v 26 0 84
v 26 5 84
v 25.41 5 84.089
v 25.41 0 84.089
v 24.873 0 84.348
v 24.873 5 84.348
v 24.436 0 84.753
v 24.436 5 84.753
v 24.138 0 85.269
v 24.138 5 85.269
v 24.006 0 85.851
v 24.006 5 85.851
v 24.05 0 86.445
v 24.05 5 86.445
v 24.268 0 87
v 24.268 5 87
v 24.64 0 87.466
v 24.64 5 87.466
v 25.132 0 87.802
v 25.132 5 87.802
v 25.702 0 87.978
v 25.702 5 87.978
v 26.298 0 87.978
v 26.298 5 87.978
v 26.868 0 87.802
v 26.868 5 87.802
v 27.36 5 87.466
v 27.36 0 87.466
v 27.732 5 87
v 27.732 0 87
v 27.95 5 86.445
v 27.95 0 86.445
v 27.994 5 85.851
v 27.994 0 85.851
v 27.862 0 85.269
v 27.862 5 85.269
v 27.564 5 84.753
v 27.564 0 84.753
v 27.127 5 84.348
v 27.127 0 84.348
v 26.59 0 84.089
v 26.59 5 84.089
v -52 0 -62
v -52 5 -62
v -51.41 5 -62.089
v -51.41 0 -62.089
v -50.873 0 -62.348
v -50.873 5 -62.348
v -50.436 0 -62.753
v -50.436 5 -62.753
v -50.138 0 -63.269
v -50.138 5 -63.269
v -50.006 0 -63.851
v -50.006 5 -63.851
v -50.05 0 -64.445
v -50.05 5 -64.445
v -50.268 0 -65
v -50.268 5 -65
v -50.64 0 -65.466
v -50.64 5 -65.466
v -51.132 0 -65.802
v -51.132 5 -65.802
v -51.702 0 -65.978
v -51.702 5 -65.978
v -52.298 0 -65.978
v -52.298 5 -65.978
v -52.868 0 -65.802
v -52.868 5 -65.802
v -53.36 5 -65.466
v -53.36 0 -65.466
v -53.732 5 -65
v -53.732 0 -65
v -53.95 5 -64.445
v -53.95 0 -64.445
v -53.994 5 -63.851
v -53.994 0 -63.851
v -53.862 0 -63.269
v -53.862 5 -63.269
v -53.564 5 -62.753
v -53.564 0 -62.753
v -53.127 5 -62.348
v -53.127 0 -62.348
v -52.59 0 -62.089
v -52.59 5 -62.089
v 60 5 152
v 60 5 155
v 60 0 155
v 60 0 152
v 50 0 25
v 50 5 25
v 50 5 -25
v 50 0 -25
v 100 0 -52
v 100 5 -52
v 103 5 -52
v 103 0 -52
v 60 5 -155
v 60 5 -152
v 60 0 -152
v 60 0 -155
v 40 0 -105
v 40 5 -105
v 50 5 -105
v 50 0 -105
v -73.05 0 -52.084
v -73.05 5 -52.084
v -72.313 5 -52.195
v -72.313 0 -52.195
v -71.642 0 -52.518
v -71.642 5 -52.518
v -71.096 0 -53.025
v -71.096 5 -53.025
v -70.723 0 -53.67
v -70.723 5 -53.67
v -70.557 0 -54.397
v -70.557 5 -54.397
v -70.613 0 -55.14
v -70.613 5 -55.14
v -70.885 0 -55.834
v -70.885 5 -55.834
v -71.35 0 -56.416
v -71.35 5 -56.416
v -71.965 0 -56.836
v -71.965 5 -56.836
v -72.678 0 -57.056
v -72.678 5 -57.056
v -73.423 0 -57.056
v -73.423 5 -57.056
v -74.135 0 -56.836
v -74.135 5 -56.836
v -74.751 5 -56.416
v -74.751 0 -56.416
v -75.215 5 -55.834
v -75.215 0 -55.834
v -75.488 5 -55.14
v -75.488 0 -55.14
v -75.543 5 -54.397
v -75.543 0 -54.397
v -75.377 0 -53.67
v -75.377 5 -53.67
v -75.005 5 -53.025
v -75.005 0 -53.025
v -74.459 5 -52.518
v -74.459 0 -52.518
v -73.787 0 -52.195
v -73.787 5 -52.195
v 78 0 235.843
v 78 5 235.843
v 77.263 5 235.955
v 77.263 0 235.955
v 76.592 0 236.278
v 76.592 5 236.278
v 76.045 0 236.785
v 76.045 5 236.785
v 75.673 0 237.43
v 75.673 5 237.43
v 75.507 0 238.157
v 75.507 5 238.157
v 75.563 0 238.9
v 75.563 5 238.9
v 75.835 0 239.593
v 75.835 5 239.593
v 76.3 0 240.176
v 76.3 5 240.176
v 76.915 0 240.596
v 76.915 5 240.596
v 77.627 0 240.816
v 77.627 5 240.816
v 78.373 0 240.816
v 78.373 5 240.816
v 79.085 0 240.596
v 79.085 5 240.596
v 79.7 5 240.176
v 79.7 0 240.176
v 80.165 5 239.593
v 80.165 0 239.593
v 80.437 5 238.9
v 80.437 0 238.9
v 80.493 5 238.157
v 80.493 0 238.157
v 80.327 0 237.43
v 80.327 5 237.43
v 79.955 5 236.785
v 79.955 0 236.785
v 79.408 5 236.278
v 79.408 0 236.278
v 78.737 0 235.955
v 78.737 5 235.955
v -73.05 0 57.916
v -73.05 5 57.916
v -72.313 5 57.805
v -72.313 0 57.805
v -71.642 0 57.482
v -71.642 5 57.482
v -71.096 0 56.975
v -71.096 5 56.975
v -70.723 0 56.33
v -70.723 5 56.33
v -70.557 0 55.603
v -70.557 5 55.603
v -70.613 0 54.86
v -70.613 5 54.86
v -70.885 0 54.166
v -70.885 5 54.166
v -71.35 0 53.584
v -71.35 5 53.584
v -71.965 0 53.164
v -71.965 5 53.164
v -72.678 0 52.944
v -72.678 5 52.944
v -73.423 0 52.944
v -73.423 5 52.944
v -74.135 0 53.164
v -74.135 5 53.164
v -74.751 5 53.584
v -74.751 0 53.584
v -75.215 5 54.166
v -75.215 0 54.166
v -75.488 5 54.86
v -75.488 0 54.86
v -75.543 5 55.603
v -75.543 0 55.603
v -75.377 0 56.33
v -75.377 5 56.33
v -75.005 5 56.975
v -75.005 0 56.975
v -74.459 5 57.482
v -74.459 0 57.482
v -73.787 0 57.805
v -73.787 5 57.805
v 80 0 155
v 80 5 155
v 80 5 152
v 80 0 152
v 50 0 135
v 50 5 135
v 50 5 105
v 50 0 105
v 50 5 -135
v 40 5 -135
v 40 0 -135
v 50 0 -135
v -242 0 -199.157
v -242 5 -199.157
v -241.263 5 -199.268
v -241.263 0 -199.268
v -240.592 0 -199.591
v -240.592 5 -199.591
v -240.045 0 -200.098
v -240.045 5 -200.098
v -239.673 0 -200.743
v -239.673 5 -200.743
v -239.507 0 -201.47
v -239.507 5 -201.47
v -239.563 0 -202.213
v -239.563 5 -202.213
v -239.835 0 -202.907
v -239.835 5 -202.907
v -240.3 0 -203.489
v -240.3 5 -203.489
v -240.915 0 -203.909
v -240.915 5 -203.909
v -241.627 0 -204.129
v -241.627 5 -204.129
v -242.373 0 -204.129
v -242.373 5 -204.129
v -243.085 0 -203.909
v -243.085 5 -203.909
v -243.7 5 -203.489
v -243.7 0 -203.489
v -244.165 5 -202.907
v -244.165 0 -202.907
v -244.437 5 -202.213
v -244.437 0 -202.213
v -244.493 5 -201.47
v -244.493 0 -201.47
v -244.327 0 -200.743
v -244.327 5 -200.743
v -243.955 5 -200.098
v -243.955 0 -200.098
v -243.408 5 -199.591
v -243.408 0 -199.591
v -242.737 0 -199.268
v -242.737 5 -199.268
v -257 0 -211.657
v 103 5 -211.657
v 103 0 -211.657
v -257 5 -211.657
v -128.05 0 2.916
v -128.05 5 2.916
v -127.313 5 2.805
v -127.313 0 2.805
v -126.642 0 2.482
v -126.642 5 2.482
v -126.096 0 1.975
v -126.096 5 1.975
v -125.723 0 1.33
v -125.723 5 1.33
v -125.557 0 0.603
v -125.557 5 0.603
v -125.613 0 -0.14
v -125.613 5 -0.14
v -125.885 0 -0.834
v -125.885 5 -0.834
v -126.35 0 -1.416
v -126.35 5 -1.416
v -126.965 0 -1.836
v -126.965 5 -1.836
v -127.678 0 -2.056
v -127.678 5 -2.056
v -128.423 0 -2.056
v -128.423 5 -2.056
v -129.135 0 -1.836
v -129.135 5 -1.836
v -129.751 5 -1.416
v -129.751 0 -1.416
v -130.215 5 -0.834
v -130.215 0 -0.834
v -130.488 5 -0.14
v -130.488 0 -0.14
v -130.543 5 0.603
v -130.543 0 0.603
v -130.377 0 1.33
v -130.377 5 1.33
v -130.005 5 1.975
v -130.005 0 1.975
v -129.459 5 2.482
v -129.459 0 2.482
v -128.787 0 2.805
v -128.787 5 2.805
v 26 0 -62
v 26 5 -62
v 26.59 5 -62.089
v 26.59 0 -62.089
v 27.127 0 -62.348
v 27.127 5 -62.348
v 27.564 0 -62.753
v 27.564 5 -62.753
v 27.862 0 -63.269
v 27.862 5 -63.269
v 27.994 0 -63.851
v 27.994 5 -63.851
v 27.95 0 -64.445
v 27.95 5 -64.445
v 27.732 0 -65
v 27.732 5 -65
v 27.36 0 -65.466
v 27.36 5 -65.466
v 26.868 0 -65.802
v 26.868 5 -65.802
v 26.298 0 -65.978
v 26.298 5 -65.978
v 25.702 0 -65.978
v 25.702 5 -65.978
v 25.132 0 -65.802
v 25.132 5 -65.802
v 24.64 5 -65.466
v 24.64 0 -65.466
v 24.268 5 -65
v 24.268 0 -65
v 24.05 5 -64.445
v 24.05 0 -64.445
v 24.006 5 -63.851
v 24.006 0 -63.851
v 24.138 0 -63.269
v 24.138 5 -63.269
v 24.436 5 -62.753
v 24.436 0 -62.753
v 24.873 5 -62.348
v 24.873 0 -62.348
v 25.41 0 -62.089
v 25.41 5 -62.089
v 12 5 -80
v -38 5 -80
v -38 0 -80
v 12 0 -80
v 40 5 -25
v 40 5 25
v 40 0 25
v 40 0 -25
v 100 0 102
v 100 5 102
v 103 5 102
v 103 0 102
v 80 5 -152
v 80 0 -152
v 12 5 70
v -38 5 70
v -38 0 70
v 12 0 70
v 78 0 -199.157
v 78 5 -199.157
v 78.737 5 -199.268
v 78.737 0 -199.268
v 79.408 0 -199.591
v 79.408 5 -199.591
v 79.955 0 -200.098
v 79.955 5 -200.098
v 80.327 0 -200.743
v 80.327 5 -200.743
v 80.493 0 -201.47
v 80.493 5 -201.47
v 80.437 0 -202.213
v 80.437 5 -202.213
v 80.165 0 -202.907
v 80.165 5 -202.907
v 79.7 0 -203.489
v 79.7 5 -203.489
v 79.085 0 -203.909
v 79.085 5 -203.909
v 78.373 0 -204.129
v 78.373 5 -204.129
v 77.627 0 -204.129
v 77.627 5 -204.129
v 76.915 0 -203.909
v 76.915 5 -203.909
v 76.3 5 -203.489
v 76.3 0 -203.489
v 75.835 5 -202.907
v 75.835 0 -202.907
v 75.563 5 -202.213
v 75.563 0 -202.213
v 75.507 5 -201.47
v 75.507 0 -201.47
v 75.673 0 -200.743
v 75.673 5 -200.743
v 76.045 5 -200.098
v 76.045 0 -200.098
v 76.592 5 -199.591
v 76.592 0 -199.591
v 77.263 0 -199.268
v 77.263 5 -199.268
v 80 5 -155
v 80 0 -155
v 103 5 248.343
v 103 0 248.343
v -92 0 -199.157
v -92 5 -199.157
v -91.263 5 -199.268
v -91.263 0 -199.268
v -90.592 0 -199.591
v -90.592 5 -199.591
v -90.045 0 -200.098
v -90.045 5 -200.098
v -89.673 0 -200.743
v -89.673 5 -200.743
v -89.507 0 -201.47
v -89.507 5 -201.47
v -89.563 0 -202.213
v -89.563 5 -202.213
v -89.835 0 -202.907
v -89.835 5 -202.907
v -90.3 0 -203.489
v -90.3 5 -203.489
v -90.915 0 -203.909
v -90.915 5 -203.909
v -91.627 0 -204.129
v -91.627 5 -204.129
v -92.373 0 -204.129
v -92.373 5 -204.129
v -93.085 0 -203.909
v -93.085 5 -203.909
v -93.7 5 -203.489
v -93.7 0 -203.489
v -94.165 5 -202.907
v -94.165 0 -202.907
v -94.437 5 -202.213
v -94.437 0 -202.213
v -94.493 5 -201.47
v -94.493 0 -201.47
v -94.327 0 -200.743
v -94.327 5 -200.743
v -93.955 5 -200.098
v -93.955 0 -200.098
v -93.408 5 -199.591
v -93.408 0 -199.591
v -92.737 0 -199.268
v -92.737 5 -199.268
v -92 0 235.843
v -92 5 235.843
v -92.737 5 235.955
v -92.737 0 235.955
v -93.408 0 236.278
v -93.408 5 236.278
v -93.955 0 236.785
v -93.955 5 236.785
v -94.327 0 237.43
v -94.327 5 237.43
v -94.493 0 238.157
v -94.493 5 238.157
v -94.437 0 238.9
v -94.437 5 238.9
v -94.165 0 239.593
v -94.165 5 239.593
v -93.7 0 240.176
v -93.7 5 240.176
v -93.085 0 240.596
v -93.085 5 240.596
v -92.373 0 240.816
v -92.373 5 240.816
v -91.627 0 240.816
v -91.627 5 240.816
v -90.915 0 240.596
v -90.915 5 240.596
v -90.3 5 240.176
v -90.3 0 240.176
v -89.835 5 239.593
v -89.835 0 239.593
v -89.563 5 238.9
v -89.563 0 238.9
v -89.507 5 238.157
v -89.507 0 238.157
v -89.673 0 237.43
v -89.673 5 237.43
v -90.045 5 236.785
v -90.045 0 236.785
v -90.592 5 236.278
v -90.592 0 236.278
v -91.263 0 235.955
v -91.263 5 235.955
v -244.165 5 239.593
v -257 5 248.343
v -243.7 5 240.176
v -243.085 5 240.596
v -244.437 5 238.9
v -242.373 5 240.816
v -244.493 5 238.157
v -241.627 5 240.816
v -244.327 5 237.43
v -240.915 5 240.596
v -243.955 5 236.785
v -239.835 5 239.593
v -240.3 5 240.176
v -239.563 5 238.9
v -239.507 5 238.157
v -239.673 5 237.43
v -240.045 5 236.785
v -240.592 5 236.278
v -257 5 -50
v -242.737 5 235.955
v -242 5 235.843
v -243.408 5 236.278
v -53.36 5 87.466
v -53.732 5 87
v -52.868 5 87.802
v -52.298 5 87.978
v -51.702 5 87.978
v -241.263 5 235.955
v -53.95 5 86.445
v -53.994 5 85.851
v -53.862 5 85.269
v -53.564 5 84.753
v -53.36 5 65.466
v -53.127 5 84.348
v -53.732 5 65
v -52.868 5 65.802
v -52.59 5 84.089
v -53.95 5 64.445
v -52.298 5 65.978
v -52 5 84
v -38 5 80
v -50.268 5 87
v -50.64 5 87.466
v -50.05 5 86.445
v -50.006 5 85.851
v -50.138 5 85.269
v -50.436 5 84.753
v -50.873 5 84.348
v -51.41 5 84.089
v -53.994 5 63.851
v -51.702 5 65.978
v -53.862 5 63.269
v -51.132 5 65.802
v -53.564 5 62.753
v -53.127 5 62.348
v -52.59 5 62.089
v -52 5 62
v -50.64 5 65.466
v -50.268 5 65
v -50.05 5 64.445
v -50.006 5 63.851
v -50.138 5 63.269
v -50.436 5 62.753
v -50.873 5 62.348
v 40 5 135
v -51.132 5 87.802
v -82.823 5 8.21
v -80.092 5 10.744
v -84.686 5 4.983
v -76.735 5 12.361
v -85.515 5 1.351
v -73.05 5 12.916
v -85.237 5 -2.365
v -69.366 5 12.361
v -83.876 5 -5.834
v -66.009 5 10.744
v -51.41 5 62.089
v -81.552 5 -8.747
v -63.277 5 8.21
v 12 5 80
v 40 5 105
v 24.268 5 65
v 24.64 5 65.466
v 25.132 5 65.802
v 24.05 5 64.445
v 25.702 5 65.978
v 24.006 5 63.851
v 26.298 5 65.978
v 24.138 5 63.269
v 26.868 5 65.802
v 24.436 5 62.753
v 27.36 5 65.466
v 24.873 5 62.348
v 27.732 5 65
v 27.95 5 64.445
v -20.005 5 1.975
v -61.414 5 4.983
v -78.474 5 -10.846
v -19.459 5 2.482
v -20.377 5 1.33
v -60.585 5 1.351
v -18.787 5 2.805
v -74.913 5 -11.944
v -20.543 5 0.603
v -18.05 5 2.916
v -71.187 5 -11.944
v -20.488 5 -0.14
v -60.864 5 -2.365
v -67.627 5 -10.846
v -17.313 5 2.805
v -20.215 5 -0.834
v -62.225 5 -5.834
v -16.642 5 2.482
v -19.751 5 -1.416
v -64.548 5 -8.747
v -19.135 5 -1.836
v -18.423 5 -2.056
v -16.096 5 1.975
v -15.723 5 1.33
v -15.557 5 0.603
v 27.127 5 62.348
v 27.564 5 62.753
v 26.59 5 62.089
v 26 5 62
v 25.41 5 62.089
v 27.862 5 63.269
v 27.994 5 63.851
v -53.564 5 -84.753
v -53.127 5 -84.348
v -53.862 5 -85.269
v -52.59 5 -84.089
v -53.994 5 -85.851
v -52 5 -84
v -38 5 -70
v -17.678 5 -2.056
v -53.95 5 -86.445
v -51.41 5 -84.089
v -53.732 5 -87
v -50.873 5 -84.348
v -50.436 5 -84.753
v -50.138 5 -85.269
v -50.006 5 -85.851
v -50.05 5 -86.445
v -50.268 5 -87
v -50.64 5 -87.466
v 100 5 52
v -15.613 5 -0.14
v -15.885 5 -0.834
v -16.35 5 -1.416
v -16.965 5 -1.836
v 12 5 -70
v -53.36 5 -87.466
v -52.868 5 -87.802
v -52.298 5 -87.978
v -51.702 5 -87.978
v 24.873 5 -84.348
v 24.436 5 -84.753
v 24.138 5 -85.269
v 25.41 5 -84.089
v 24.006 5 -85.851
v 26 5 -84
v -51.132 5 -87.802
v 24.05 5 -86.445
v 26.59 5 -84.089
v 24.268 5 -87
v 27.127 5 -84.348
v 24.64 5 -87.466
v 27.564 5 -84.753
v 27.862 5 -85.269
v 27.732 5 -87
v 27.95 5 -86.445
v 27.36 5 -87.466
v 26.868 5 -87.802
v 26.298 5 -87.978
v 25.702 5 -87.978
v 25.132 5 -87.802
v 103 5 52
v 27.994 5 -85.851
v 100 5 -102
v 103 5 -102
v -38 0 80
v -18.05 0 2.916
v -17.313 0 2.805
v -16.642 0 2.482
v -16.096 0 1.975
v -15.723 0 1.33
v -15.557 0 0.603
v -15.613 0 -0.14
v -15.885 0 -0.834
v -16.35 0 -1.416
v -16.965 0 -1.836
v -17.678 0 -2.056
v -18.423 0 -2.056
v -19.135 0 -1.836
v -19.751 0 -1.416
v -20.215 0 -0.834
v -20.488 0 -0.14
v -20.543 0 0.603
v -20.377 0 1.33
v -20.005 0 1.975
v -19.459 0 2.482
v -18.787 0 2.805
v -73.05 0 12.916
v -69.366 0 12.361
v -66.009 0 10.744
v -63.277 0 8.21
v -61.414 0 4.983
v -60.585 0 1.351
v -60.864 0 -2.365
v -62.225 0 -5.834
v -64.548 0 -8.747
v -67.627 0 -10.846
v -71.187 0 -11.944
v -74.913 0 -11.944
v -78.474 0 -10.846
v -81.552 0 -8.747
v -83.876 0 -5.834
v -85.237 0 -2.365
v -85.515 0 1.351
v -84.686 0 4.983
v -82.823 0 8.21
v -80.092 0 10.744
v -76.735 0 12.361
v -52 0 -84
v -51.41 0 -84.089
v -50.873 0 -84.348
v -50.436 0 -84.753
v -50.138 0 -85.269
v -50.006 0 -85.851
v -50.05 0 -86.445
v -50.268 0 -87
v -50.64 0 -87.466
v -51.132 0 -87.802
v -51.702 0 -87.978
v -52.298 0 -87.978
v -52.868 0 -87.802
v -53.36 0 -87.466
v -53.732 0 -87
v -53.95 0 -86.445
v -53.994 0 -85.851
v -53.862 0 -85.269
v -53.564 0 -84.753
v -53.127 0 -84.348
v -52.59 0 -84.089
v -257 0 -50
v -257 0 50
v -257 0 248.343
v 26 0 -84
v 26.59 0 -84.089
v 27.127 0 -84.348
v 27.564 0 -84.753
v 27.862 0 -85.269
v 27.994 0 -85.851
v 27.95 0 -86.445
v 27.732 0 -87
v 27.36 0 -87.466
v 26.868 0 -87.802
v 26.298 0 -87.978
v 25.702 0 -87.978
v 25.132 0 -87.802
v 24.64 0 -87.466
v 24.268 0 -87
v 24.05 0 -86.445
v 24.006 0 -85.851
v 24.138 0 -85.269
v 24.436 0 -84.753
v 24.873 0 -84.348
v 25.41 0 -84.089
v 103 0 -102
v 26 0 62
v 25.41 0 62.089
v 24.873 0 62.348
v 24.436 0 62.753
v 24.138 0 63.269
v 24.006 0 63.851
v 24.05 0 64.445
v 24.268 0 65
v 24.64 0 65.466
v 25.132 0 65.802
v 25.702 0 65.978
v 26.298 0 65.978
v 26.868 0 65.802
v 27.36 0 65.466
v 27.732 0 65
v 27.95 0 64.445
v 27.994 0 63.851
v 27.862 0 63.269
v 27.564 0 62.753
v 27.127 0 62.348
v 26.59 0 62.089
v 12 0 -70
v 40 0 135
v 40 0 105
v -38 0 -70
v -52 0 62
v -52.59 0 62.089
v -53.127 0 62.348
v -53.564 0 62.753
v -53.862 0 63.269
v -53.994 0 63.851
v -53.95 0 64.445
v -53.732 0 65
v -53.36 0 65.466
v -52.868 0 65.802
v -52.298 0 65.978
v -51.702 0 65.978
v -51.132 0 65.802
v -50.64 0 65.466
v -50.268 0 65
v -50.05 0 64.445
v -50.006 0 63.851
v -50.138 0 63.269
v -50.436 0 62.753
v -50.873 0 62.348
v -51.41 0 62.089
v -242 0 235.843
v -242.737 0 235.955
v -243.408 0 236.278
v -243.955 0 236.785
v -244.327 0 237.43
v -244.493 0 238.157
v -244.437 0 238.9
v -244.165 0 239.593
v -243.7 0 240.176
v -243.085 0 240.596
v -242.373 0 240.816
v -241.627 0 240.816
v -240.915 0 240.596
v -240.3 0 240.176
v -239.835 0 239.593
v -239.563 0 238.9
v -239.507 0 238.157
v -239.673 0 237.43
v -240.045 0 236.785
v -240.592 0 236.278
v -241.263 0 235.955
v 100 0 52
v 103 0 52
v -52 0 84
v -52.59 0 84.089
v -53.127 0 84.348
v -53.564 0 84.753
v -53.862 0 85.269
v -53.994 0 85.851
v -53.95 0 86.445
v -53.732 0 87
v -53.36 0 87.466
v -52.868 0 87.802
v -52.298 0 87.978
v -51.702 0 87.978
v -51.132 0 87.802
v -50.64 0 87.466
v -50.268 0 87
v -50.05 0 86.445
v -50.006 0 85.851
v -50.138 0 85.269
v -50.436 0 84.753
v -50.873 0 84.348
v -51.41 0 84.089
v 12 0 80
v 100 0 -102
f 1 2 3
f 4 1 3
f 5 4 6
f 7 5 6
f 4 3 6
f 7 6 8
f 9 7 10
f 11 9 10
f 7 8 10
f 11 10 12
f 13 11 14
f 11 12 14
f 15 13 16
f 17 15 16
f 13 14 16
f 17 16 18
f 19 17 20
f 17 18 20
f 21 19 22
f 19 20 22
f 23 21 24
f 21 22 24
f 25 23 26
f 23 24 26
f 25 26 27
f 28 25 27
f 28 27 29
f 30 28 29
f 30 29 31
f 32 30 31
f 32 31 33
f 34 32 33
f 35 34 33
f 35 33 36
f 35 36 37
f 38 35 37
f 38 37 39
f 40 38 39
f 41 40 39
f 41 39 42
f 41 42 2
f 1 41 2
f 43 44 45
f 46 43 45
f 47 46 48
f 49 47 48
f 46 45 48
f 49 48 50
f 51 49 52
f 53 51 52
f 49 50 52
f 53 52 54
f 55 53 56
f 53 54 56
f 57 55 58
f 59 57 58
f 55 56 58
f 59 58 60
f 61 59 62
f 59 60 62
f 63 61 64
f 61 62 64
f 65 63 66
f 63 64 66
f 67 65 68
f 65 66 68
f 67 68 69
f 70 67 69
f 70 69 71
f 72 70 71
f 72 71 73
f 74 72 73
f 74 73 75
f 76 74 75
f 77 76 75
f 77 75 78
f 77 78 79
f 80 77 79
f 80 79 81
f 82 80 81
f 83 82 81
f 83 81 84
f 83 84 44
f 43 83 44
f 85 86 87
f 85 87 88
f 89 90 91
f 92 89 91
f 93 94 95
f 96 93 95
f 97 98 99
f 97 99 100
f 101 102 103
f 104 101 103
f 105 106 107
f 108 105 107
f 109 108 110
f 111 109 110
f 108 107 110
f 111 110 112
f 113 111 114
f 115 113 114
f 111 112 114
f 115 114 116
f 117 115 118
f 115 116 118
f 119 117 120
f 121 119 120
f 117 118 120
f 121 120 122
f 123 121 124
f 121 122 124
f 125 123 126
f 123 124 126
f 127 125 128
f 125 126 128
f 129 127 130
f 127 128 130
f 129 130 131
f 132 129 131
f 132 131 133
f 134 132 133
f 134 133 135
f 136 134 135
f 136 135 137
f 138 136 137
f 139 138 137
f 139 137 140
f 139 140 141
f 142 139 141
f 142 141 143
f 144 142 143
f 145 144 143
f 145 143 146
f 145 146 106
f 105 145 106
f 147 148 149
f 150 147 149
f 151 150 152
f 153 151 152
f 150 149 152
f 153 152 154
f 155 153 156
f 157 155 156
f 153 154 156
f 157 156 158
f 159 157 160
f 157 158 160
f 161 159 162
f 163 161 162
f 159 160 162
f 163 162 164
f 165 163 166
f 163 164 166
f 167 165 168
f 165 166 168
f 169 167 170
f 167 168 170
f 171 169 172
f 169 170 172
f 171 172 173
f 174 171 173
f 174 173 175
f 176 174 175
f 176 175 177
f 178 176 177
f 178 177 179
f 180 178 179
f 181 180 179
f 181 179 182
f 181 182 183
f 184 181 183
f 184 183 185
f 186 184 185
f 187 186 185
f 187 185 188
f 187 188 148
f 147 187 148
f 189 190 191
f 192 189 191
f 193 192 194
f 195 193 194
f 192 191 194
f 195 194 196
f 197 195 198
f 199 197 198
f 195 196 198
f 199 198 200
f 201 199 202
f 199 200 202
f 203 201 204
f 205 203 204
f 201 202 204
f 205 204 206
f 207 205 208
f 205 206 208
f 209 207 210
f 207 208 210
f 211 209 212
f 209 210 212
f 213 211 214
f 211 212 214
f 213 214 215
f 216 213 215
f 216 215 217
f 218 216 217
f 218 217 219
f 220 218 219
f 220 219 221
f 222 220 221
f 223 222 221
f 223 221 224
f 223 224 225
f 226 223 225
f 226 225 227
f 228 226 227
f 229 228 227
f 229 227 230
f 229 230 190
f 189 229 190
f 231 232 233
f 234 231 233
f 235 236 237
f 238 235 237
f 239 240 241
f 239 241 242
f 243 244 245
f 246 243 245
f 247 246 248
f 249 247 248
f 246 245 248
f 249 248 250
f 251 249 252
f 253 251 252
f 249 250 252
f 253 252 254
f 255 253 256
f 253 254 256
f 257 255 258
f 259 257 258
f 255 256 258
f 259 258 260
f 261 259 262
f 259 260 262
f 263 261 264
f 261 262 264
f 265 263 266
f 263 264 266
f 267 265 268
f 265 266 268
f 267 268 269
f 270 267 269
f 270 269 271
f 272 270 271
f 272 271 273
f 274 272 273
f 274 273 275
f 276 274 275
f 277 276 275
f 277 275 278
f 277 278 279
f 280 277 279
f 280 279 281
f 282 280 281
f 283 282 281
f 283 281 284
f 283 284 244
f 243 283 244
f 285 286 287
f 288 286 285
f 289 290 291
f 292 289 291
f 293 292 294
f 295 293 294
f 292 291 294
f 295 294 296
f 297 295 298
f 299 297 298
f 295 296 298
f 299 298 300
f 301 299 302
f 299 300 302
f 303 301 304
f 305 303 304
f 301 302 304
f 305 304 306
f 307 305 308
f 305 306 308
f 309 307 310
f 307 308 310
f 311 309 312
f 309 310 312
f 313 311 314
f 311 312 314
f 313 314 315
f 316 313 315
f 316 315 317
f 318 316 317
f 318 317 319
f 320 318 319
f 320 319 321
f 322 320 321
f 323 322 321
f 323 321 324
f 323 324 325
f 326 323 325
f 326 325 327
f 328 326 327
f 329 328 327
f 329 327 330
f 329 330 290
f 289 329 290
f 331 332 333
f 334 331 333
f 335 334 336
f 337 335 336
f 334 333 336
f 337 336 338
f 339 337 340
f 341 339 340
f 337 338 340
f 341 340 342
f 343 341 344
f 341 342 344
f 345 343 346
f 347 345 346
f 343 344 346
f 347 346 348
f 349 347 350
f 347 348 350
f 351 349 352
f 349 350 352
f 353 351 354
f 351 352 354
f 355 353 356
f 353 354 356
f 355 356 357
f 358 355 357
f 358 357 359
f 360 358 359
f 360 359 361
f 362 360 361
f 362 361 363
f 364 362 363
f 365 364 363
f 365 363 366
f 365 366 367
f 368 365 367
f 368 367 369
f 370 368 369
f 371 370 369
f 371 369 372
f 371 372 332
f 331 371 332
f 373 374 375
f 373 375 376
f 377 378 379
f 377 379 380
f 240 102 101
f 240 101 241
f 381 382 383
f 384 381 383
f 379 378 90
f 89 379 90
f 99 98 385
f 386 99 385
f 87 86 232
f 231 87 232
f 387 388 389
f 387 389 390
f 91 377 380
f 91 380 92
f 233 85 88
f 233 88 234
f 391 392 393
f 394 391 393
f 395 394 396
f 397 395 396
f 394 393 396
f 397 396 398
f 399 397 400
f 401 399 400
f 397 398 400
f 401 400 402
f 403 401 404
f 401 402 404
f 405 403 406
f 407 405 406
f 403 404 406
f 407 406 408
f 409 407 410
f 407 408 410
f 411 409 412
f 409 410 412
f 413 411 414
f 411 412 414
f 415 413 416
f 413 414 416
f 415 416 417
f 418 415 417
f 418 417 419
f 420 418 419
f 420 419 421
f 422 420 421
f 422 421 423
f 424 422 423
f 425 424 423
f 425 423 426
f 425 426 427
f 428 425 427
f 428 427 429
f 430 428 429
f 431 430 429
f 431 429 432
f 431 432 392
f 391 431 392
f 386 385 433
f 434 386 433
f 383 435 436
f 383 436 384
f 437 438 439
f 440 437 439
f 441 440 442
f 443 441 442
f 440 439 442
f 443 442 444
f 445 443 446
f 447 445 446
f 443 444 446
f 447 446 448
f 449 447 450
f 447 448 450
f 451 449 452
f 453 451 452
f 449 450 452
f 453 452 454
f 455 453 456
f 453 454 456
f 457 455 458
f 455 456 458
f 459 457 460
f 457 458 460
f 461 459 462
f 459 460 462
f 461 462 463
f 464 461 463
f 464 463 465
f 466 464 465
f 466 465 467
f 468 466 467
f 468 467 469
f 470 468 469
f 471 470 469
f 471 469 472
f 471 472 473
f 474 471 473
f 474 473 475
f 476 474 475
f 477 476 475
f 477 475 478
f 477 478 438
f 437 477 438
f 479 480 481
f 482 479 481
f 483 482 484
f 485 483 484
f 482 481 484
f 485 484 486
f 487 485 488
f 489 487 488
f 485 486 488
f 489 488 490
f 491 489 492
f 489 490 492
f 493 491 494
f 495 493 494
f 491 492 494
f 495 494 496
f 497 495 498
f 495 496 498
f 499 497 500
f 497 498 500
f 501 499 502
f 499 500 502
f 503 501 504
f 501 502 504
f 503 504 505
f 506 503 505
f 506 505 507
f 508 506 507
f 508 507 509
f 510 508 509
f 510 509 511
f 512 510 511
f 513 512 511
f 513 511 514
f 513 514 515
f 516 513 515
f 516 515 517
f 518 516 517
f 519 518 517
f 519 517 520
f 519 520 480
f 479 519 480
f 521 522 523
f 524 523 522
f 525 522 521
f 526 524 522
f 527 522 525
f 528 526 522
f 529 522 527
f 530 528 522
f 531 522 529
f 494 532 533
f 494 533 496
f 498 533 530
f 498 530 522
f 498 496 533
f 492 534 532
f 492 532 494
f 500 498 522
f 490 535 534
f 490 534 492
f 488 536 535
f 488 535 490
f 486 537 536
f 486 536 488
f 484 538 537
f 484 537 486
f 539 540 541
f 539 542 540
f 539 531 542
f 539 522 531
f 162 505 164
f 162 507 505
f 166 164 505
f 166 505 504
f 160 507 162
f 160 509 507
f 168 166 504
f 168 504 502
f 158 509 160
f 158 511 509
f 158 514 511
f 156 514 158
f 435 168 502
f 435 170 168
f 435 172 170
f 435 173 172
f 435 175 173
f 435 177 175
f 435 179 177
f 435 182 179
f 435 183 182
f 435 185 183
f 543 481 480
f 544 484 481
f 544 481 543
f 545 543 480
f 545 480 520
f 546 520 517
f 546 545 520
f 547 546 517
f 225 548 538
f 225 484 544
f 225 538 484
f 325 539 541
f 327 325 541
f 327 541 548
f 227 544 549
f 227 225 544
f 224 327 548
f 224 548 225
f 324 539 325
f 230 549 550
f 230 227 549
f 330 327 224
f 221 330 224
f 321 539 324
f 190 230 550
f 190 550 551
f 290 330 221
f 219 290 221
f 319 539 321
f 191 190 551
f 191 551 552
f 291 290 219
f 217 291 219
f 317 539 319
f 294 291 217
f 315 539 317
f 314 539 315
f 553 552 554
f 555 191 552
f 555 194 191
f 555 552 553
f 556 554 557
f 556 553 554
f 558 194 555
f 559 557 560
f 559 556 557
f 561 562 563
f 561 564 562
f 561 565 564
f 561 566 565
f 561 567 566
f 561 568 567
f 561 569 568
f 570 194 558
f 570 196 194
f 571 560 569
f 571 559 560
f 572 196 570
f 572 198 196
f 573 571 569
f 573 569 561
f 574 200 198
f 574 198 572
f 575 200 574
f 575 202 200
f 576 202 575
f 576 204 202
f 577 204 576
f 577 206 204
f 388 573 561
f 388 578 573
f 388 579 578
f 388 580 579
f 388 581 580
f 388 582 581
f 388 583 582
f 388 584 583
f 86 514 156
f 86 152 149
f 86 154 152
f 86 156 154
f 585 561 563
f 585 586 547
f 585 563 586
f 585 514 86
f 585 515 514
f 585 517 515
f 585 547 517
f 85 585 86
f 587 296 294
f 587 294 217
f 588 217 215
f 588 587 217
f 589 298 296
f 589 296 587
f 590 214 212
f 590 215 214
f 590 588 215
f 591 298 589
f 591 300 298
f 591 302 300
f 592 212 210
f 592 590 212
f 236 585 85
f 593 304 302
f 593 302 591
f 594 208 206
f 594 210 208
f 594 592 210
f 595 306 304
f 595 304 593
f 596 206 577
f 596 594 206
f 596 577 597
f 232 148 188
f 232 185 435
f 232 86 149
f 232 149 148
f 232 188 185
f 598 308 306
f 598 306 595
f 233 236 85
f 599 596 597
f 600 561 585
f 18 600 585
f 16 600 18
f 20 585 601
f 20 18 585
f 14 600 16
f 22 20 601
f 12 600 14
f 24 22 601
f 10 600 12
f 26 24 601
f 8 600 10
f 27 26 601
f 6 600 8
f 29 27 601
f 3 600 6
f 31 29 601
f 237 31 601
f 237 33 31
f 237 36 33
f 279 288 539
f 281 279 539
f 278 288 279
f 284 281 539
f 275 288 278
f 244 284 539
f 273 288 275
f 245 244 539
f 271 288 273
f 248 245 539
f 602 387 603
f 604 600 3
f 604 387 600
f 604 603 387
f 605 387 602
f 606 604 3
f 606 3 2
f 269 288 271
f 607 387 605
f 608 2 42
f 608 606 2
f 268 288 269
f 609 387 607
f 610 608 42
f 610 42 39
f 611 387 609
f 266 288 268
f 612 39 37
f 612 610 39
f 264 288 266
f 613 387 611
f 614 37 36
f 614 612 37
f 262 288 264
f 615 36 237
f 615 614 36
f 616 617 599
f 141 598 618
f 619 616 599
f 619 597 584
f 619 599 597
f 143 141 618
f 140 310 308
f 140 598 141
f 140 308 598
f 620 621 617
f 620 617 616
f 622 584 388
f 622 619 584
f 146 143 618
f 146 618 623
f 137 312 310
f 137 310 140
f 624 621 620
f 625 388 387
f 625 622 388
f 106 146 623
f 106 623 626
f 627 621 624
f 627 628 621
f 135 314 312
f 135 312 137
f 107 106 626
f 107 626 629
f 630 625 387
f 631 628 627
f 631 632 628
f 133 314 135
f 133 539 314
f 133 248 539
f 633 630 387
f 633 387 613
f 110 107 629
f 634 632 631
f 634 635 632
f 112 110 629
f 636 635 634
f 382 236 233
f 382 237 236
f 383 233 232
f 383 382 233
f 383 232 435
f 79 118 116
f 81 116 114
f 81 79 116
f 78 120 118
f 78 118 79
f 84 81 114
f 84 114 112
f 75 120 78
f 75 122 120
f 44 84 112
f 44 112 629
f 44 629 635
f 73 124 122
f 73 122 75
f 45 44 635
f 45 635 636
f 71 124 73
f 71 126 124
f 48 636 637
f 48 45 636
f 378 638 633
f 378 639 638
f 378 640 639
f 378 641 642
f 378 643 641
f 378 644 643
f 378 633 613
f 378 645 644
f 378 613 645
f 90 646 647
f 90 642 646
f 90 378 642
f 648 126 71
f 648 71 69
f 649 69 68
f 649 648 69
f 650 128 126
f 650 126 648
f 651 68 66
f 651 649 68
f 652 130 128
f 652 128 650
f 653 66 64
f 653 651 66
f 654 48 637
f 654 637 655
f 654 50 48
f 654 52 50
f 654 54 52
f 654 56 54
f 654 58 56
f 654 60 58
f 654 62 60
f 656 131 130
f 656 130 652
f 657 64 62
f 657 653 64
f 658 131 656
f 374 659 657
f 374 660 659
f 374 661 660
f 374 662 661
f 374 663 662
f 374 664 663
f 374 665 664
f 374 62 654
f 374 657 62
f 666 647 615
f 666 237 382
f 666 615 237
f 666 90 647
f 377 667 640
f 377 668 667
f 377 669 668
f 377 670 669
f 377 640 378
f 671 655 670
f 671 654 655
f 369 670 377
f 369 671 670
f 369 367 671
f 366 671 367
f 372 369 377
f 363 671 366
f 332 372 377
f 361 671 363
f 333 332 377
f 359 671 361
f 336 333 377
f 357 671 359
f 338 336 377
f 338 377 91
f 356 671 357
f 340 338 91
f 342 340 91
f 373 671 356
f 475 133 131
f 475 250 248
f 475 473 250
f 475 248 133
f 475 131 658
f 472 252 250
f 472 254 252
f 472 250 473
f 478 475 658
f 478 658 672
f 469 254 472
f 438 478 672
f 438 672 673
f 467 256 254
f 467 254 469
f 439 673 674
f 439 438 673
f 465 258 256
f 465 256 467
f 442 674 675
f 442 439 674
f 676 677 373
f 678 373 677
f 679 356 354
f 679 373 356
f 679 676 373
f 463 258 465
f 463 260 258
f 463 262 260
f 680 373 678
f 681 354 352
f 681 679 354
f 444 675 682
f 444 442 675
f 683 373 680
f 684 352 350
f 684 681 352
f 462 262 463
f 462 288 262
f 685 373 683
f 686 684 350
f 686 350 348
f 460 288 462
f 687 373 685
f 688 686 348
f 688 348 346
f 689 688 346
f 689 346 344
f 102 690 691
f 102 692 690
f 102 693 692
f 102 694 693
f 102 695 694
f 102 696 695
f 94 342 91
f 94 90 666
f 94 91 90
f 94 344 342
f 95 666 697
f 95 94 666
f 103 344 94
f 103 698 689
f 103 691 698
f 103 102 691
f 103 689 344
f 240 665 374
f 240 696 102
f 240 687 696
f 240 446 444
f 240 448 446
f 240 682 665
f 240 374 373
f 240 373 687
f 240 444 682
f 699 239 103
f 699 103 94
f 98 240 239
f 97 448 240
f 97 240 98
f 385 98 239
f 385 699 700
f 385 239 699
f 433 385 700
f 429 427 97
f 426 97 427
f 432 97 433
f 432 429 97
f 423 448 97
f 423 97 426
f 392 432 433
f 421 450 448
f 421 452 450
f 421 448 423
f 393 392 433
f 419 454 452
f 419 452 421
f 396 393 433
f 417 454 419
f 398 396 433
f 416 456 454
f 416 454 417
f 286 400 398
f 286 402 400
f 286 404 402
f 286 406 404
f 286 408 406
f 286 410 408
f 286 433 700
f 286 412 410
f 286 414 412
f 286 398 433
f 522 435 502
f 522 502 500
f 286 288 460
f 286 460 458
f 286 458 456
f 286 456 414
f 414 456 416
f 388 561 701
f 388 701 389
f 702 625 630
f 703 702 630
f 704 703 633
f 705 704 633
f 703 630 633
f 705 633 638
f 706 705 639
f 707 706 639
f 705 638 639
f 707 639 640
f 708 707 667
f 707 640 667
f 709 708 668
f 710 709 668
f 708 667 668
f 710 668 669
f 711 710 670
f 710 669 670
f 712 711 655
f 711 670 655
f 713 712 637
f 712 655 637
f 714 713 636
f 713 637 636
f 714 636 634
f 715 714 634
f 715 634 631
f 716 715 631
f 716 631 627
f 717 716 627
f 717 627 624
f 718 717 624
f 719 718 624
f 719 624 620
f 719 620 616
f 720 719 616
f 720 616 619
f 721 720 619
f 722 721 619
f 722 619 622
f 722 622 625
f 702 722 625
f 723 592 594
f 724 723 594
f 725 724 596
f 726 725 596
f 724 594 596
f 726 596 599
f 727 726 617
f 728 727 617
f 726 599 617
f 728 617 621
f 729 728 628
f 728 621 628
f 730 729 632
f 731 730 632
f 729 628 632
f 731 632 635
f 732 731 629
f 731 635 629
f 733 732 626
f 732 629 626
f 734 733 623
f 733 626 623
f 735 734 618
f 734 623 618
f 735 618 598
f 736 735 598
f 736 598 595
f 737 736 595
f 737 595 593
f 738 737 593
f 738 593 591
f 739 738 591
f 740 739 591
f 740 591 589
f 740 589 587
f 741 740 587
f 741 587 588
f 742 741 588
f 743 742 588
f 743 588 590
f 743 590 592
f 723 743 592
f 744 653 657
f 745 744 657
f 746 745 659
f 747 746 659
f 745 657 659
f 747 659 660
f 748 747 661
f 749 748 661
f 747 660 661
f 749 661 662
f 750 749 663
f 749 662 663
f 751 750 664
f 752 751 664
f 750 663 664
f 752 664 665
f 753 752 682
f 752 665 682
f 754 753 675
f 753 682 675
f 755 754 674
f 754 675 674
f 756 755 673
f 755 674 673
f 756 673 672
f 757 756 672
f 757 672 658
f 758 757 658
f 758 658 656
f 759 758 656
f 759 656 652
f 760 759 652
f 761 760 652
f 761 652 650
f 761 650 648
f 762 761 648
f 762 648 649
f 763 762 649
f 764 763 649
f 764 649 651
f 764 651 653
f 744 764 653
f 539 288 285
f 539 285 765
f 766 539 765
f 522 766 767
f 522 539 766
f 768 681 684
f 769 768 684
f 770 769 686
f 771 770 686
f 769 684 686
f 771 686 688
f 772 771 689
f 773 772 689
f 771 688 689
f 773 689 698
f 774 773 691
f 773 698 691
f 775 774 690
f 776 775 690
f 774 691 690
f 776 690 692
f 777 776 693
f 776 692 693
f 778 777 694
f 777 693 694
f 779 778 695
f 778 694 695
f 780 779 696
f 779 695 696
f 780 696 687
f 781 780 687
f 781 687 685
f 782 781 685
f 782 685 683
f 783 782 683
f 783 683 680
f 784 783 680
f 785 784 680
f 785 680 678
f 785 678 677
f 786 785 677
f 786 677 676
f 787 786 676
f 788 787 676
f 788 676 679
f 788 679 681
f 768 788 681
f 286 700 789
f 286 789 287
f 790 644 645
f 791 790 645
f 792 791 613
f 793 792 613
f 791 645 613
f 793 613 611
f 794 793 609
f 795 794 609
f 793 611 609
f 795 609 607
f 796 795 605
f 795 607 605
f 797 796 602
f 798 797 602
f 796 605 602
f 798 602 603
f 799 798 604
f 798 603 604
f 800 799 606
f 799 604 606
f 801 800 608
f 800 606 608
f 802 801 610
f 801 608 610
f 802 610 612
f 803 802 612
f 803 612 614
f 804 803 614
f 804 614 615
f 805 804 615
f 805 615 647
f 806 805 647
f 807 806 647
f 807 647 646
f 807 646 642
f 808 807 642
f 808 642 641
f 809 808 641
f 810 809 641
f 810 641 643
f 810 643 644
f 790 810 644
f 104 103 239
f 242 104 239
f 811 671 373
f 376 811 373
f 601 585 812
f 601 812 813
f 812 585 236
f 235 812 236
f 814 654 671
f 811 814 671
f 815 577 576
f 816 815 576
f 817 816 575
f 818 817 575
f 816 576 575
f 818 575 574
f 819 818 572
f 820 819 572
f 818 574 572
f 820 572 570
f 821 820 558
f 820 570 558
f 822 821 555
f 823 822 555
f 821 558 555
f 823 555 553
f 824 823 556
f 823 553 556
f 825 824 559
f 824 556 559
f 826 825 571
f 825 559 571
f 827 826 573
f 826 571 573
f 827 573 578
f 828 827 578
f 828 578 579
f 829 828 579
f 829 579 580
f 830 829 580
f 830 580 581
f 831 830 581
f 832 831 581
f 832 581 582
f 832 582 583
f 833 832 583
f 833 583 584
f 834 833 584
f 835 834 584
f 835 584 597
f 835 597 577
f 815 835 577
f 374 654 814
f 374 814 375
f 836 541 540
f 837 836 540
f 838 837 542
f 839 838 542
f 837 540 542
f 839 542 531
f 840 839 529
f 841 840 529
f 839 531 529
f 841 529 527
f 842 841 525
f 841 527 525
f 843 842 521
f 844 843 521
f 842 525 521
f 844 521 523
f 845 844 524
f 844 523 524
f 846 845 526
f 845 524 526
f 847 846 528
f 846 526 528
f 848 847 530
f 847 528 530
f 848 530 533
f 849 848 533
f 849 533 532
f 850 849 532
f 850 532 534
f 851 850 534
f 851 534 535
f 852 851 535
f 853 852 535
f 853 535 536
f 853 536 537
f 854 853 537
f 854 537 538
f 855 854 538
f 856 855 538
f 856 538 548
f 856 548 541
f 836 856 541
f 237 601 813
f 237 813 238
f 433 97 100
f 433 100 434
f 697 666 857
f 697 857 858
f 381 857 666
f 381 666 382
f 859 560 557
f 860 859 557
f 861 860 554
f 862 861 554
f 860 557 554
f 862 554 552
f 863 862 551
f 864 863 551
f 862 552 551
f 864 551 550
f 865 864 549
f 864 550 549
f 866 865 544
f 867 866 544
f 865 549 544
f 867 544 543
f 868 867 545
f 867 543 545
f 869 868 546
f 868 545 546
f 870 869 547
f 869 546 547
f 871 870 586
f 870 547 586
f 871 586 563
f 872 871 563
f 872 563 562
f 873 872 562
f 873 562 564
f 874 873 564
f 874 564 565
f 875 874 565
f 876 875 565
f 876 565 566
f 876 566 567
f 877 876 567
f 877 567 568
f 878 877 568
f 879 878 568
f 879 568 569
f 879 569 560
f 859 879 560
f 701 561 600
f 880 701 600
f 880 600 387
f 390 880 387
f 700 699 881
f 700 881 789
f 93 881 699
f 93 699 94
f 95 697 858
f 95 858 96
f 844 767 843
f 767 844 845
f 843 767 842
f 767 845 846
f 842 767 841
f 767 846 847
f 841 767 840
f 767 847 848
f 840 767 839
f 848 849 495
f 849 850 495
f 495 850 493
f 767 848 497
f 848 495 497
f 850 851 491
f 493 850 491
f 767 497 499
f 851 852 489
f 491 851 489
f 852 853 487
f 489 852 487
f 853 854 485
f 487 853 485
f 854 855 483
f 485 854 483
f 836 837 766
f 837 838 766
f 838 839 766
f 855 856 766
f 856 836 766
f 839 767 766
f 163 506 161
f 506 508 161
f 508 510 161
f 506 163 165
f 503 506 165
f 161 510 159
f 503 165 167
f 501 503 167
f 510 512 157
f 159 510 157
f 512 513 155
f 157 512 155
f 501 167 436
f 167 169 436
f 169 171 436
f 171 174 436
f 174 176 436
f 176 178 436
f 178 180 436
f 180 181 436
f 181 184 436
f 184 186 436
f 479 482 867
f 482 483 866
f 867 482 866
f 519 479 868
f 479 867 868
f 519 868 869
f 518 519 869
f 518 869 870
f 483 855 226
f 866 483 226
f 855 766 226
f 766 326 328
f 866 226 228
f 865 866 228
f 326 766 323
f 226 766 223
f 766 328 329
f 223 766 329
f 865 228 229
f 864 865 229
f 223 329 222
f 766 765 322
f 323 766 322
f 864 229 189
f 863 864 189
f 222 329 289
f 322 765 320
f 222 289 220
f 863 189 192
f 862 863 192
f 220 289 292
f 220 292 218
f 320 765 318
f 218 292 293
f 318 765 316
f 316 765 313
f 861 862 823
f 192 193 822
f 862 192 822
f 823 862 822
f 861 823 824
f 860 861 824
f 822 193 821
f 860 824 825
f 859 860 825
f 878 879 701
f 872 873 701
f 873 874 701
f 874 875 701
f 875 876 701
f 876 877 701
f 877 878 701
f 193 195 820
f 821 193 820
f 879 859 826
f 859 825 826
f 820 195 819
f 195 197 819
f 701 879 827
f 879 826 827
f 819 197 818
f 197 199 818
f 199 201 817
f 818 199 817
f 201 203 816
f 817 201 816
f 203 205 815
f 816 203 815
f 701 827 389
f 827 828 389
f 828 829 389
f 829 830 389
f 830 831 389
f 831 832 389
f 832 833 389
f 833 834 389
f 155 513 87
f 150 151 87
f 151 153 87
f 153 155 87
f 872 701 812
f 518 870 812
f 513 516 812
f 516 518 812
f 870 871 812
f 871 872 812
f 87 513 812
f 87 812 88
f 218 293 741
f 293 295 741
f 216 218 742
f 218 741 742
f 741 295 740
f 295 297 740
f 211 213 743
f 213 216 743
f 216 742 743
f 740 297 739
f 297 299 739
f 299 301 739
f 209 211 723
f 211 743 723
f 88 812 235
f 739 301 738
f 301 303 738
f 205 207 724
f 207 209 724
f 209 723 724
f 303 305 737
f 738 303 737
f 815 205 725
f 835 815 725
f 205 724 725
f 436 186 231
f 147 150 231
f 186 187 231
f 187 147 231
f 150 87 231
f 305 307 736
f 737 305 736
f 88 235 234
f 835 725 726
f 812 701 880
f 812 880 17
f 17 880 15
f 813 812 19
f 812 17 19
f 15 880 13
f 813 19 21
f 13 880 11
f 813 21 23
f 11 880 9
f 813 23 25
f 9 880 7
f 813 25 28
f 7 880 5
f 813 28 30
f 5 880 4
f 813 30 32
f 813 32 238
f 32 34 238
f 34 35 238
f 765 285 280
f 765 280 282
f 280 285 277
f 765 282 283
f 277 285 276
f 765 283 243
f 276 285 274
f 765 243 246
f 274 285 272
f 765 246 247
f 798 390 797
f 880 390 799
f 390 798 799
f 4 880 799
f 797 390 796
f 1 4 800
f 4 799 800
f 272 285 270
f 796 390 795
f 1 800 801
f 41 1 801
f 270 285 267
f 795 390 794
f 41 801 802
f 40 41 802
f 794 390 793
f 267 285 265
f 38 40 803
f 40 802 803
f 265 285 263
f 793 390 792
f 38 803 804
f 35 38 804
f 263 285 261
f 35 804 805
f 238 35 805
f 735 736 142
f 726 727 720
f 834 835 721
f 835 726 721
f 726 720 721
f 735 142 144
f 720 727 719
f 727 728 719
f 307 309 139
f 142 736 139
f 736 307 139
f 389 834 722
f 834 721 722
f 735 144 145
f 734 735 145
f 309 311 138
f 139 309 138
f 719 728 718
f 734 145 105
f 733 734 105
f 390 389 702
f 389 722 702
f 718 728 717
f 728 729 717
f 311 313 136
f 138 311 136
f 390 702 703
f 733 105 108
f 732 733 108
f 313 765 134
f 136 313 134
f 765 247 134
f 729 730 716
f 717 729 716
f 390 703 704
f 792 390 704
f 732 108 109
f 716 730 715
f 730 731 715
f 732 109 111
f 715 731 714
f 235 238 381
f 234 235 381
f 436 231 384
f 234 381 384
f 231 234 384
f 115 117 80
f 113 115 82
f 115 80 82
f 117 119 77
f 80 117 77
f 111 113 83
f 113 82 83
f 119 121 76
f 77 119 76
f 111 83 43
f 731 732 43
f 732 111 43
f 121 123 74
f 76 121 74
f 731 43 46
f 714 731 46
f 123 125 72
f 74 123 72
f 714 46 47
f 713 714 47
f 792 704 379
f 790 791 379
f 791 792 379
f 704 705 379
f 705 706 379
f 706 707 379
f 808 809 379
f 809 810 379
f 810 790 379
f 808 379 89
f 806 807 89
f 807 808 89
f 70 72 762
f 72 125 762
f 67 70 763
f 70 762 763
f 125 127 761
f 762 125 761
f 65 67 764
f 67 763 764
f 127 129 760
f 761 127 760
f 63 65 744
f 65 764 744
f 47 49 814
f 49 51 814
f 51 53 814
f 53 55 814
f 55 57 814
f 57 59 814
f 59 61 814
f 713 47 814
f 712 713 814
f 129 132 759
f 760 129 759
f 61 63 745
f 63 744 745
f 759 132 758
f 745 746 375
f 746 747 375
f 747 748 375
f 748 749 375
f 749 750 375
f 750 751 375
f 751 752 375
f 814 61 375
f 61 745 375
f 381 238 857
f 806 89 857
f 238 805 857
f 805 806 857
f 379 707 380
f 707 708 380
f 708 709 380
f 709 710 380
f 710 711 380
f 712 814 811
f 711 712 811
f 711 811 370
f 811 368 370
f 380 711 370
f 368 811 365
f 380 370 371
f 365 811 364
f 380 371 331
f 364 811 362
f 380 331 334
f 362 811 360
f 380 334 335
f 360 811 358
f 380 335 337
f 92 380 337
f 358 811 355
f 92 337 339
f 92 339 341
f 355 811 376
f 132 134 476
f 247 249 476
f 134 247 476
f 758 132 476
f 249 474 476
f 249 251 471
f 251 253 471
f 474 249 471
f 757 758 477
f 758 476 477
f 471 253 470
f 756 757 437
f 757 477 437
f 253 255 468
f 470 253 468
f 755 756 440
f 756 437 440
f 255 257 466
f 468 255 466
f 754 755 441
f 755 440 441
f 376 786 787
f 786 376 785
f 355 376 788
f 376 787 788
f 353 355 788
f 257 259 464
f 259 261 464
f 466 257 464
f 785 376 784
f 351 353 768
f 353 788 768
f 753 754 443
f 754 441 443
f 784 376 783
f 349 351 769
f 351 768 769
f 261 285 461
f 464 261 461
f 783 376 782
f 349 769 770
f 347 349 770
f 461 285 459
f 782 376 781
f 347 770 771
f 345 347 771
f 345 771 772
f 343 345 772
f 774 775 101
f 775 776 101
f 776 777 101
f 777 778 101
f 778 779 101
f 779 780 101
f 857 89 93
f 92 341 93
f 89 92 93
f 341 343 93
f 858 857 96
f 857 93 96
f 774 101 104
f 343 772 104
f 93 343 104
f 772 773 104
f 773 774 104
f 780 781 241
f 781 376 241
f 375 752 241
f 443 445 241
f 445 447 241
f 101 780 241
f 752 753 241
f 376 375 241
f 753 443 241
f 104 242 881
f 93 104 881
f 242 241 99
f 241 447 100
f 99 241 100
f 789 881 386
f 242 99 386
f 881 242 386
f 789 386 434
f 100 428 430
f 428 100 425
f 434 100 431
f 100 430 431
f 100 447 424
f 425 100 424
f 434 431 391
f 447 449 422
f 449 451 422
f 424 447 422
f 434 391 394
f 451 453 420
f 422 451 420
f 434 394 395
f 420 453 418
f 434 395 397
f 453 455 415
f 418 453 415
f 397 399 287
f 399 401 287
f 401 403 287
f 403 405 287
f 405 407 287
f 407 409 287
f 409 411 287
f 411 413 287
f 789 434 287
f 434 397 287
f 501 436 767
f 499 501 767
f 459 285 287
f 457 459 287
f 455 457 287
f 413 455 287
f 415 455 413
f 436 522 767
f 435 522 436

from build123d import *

# Parameters (mm, degrees)
EXTRUDE_1_DEPTH     = 5
SKETCH_2_W          = 20
SKETCH_2_H          = 3
SKETCH_2_W_2        = 10
SKETCH_2_H_2        = 30
SKETCH_2_H_3        = 50
CUT_EXTRUDE_1_DEPTH = 211.35683968
EXTRUDE_2_DEPTH     = 5
SKETCH_4_R          = 2
CUT_EXTRUDE_2_DEPTH = 620.212910153
SKETCH_6_W          = 3
SKETCH_6_H          = 50
SKETCH_6_H_2        = 104
EXTRUDE_3_DEPTH     = 5
EXTRUDE_4_DEPTH     = 5
SKETCH_8_R          = 2
SKETCH_8_W          = 50
SKETCH_8_H          = 10
CUT_EXTRUDE_3_DEPTH = 620.212910153
SKETCH_9_R          = 2
CUT_EXTRUDE_4_DEPTH = 620.212910153
SKETCH_10_R         = 7.5
CUT_EXTRUDE_5_DEPTH = 620.212910153
EXTRUDE_5_DEPTH     = 5
SKETCH_12_W         = 370.436309817
SKETCH_12_H         = 460
CUT_EXTRUDE_6_DEPTH = 641.99462376
SKETCH_15_R         = 2.5
SKETCH_15_R_2       = 12.5
CUT_EXTRUDE_7_DEPTH = 358.41919309
SKETCH_16_R         = 2
EXTRUDE_6_DEPTH     = 5


with BuildPart() as part:
    # 스케치1 → 보스-돌출1 (new body)
    with BuildSketch(Plane(origin=(0, 0, 0), x_dir=(1, 0, 0), z_dir=(0, 1, 0))):
        Polygon((-50, 175), (0, 175), (0, 185), (50, 185), (50, 175), (100, 175), (100, -175), (50, -175), (50, -185), (0, -185), (0, -175), (-50, -175), (-50, -185), (-100, -185), (-100, -175), (-100, 175), (-100, 185), (-50, 185), align=None)
    extrude(amount=EXTRUDE_1_DEPTH)

    # 스케치2 → 컷-돌출1 (cut, through all)
    with BuildSketch(Plane(origin=(0, 5, 0), x_dir=(1, 0, 0), z_dir=(0, 1, 0))):
        with Locations((70, 153.5)):
            Rectangle(SKETCH_2_W, SKETCH_2_H)
        with Locations((70, -153.5)):
            Rectangle(SKETCH_2_W, SKETCH_2_H)
        with Locations((45, 120)):
            Rectangle(SKETCH_2_W_2, SKETCH_2_H_2)
        with Locations((45, -120)):
            Rectangle(SKETCH_2_W_2, SKETCH_2_H_2)
        with Locations((45, 0)):
            Rectangle(SKETCH_2_W_2, SKETCH_2_H_3)
    extrude(amount=-CUT_EXTRUDE_1_DEPTH, mode=Mode.SUBTRACT)

    # 스케치3 → 보스-돌출2 (add)
    with BuildSketch(Plane(origin=(0, 5, 0), x_dir=(1, 0, 0), z_dir=(0, 1, 0))):
        Polygon((-540.91, 50), (-225, 50), (-100, 50), (-100, -50), (-225, -50), (-540.91, -50), (-540.91, -185), (-590.91, -185), (-590.91, 185), (-540.91, 185), align=None)
    extrude(amount=-EXTRUDE_2_DEPTH)

    # 스케치4 → 컷-돌출2 (cut, through all)
    with BuildSketch(Plane(origin=(0, 5, 0), x_dir=(1, 0, 0), z_dir=(0, 1, 0))):
        with Locations(Location((-578.91, 145, 0), (0, 0, 270))):
            Circle(SKETCH_4_R)
        with Locations(Location((-578.91, 95, 0), (0, 0, 270))):
            Circle(SKETCH_4_R)
        with Locations(Location((-566.91, 145, 0), (0, 0, 270))):
            Circle(SKETCH_4_R)
        with Locations(Location((-566.91, 95, 0), (0, 0, 270))):
            Circle(SKETCH_4_R)
        with Locations(Location((-578.91, -145, 0), (0, 0, 270))):
            Circle(SKETCH_4_R)
        with Locations(Location((-578.91, -95, 0), (0, 0, 270))):
            Circle(SKETCH_4_R)
        with Locations(Location((-566.91, -95, 0), (0, 0, 270))):
            Circle(SKETCH_4_R)
        with Locations(Location((-566.91, -145, 0), (0, 0, 270))):
            Circle(SKETCH_4_R)
    extrude(amount=-CUT_EXTRUDE_2_DEPTH, mode=Mode.SUBTRACT)

    # 스케치6 → 보스-돌출3 (add)
    with BuildSketch(Plane(origin=(0, 5, 0), x_dir=(1, 0, 0), z_dir=(0, 1, 0))):
        with Locations((101.5, -127)):
            Rectangle(SKETCH_6_W, SKETCH_6_H)
        with Locations((101.5, 127)):
            Rectangle(SKETCH_6_W, SKETCH_6_H)
        with Locations((101.5, 0)):
            Rectangle(SKETCH_6_W, SKETCH_6_H_2)
    extrude(amount=-EXTRUDE_3_DEPTH)

    # 스케치7 → 보스-돌출4 (add)
    with BuildSketch(Plane(origin=(0, 5, 0), x_dir=(1, 0, 0), z_dir=(0, 1, 0))):
        Polygon((-540.91, -185), (-537.91, -185), (-537.91, -92), (-495.91, -50), (-540.91, -50), align=None)
        Polygon((-537.91, 92), (-495.91, 50), (-540.91, 50), (-540.91, 185), (-537.91, 185), align=None)
        Polygon((-100, 95), (-145, 50), (-100, 50), align=None)
        Polygon((-100, -95), (-145, -50), (-100, -50), align=None)
    extrude(amount=-EXTRUDE_4_DEPTH)

    # 스케치8 → 컷-돌출3 (cut, through all)
    with BuildSketch(Plane(origin=(0, 5, 0), x_dir=(1, 0, 0), z_dir=(0, 1, 0))):
        with Locations(Location((-52, 86, 0), (0, 0, 270))):
            Circle(SKETCH_8_R)
        with Locations(Location((-52, 64, 0), (0, 0, 270))):
            Circle(SKETCH_8_R)
        with Locations(Location((26, 86, 0), (0, 0, 270))):
            Circle(SKETCH_8_R)
        with Locations(Location((26, 64, 0), (0, 0, 270))):
            Circle(SKETCH_8_R)
        with Locations(Location((-52, -86, 0), (0, 0, 90))):
            Circle(SKETCH_8_R)
        with Locations(Location((-52, -64, 0), (0, 0, 90))):
            Circle(SKETCH_8_R)
        with Locations(Location((26, -64, 0), (0, 0, 90))):
            Circle(SKETCH_8_R)
        with Locations(Location((26, -86, 0), (0, 0, 90))):
            Circle(SKETCH_8_R)
        with Locations((-13, 75)):
            Rectangle(SKETCH_8_W, SKETCH_8_H)
        with Locations((-13, -75)):
            Rectangle(SKETCH_8_W, SKETCH_8_H)
    extrude(amount=-CUT_EXTRUDE_3_DEPTH, mode=Mode.SUBTRACT)

    # 스케치9 → 컷-돌출4 (cut, through all)
    with BuildSketch(Plane(origin=(0, 5, 0), x_dir=(1, 0, 0), z_dir=(0, 1, 0))):
        with Locations(Location((-437.91, 30, 0), (0, 0, 270))):
            Circle(SKETCH_9_R)
        with Locations(Location((-235.58, 30, 0), (0, 0, 270))):
            Circle(SKETCH_9_R)
        with Locations(Location((-185.58, 30, 0), (0, 0, 270))):
            Circle(SKETCH_9_R)
        with Locations(Location((-185.58, -30, 0), (0, 0, 90))):
            Circle(SKETCH_9_R)
        with Locations(Location((-235.58, -30, 0), (0, 0, 90))):
            Circle(SKETCH_9_R)
        with Locations(Location((-437.91, -30, 0), (0, 0, 90))):
            Circle(SKETCH_9_R)
    extrude(amount=-CUT_EXTRUDE_4_DEPTH, mode=Mode.SUBTRACT)

    # 스케치10 → 컷-돌출5 (cut, through all)
    with BuildSketch(Plane(origin=(0, 5, 0), x_dir=(1, 0, 0), z_dir=(0, 1, 0))):
        with Locations(Location((-73, 0, 0), (0, 0, 270))):
            Circle(SKETCH_10_R)
    extrude(amount=-CUT_EXTRUDE_5_DEPTH, mode=Mode.SUBTRACT)

    # 스케치11 → 보스-돌출5 (add)
    with BuildSketch(Plane(origin=(0, 5, 0), x_dir=(1, 0, 0), z_dir=(0, 1, 0))):
        Polygon((-145, -50), (-257, -50), (-257, -248.343471002), (103, -248.343471002), (103, -152), (100, -152), (100, -175), (50, -175), (50, -185), (0, -185), (0, -175), (-50, -175), (-50, -185), (-100, -185), (-100, -95), align=None)
        Polygon((103, 152), (103, 211.656528998), (-257, 211.656528998), (-257, 50), (-145, 50), (-100, 95), (-100, 185), (-50, 185), (-50, 175), (0, 175), (0, 185), (50, 185), (50, 175), (100, 175), (100, 152), align=None)
    extrude(amount=-EXTRUDE_5_DEPTH)

    # 스케치12 → 컷-돌출6 (cut, through all)
    with BuildSketch(Plane(origin=(0, 5, 0), x_dir=(1, 0, 0), z_dir=(0, 1, 0))):
        with Locations((-442.218154909, -18.343471002)):
            Rectangle(SKETCH_12_W, SKETCH_12_H)
    extrude(amount=-CUT_EXTRUDE_6_DEPTH, mode=Mode.SUBTRACT)

    # 스케치15 → 컷-돌출7 (cut, through all)
    with BuildSketch(Plane(origin=(0, 5, 0), x_dir=(1, 0, 0), z_dir=(0, 1, 0))):
        with Locations(Location((-73.050208533, -55.416458765, 0), (0, 0, 270))):
            Circle(SKETCH_15_R)
        with Locations(Location((-128.050208533, -0.416458765, 0), (0, 0, 270))):
            Circle(SKETCH_15_R)
        with Locations(Location((-73.050208533, 54.583541235, 0), (0, 0, 270))):
            Circle(SKETCH_15_R)
        with Locations(Location((-18.050208533, -0.416458765, 0), (0, 0, 270))):
            Circle(SKETCH_15_R)
        with Locations(Location((-73.050208533, -0.416458765, 0), (0, 0, 270))):
            Circle(SKETCH_15_R_2)
        with Locations(Location((-242, 201.656528998, 0), (0, 0, 270))):
            Circle(SKETCH_15_R)
        with Locations(Location((-92, 201.656528998, 0), (0, 0, 270))):
            Circle(SKETCH_15_R)
        with Locations(Location((78, 201.656528998, 0), (0, 0, 270))):
            Circle(SKETCH_15_R)
        with Locations(Location((78, -238.343471002, 0), (0, 0, 90))):
            Circle(SKETCH_15_R)
        with Locations(Location((-92, -238.343471002, 0), (0, 0, 90))):
            Circle(SKETCH_15_R)
        with Locations(Location((-242, -238.343471002, 0), (0, 0, 90))):
            Circle(SKETCH_15_R)
    extrude(amount=-CUT_EXTRUDE_7_DEPTH, mode=Mode.SUBTRACT)

    # 스케치16 → 보스-돌출6 (add)
    with BuildSketch(Plane(origin=(0, 5, 0), x_dir=(1, 0, 0), z_dir=(0, 1, 0))):
        with Locations((-185.58, -30)):
            Circle(SKETCH_16_R)
        with Locations((-235.58, -30)):
            Circle(SKETCH_16_R)
        with Locations((-185.58, 30)):
            Circle(SKETCH_16_R)
        with Locations((-235.58, 30)):
            Circle(SKETCH_16_R)
    extrude(amount=-EXTRUDE_6_DEPTH)


solid = part.part
